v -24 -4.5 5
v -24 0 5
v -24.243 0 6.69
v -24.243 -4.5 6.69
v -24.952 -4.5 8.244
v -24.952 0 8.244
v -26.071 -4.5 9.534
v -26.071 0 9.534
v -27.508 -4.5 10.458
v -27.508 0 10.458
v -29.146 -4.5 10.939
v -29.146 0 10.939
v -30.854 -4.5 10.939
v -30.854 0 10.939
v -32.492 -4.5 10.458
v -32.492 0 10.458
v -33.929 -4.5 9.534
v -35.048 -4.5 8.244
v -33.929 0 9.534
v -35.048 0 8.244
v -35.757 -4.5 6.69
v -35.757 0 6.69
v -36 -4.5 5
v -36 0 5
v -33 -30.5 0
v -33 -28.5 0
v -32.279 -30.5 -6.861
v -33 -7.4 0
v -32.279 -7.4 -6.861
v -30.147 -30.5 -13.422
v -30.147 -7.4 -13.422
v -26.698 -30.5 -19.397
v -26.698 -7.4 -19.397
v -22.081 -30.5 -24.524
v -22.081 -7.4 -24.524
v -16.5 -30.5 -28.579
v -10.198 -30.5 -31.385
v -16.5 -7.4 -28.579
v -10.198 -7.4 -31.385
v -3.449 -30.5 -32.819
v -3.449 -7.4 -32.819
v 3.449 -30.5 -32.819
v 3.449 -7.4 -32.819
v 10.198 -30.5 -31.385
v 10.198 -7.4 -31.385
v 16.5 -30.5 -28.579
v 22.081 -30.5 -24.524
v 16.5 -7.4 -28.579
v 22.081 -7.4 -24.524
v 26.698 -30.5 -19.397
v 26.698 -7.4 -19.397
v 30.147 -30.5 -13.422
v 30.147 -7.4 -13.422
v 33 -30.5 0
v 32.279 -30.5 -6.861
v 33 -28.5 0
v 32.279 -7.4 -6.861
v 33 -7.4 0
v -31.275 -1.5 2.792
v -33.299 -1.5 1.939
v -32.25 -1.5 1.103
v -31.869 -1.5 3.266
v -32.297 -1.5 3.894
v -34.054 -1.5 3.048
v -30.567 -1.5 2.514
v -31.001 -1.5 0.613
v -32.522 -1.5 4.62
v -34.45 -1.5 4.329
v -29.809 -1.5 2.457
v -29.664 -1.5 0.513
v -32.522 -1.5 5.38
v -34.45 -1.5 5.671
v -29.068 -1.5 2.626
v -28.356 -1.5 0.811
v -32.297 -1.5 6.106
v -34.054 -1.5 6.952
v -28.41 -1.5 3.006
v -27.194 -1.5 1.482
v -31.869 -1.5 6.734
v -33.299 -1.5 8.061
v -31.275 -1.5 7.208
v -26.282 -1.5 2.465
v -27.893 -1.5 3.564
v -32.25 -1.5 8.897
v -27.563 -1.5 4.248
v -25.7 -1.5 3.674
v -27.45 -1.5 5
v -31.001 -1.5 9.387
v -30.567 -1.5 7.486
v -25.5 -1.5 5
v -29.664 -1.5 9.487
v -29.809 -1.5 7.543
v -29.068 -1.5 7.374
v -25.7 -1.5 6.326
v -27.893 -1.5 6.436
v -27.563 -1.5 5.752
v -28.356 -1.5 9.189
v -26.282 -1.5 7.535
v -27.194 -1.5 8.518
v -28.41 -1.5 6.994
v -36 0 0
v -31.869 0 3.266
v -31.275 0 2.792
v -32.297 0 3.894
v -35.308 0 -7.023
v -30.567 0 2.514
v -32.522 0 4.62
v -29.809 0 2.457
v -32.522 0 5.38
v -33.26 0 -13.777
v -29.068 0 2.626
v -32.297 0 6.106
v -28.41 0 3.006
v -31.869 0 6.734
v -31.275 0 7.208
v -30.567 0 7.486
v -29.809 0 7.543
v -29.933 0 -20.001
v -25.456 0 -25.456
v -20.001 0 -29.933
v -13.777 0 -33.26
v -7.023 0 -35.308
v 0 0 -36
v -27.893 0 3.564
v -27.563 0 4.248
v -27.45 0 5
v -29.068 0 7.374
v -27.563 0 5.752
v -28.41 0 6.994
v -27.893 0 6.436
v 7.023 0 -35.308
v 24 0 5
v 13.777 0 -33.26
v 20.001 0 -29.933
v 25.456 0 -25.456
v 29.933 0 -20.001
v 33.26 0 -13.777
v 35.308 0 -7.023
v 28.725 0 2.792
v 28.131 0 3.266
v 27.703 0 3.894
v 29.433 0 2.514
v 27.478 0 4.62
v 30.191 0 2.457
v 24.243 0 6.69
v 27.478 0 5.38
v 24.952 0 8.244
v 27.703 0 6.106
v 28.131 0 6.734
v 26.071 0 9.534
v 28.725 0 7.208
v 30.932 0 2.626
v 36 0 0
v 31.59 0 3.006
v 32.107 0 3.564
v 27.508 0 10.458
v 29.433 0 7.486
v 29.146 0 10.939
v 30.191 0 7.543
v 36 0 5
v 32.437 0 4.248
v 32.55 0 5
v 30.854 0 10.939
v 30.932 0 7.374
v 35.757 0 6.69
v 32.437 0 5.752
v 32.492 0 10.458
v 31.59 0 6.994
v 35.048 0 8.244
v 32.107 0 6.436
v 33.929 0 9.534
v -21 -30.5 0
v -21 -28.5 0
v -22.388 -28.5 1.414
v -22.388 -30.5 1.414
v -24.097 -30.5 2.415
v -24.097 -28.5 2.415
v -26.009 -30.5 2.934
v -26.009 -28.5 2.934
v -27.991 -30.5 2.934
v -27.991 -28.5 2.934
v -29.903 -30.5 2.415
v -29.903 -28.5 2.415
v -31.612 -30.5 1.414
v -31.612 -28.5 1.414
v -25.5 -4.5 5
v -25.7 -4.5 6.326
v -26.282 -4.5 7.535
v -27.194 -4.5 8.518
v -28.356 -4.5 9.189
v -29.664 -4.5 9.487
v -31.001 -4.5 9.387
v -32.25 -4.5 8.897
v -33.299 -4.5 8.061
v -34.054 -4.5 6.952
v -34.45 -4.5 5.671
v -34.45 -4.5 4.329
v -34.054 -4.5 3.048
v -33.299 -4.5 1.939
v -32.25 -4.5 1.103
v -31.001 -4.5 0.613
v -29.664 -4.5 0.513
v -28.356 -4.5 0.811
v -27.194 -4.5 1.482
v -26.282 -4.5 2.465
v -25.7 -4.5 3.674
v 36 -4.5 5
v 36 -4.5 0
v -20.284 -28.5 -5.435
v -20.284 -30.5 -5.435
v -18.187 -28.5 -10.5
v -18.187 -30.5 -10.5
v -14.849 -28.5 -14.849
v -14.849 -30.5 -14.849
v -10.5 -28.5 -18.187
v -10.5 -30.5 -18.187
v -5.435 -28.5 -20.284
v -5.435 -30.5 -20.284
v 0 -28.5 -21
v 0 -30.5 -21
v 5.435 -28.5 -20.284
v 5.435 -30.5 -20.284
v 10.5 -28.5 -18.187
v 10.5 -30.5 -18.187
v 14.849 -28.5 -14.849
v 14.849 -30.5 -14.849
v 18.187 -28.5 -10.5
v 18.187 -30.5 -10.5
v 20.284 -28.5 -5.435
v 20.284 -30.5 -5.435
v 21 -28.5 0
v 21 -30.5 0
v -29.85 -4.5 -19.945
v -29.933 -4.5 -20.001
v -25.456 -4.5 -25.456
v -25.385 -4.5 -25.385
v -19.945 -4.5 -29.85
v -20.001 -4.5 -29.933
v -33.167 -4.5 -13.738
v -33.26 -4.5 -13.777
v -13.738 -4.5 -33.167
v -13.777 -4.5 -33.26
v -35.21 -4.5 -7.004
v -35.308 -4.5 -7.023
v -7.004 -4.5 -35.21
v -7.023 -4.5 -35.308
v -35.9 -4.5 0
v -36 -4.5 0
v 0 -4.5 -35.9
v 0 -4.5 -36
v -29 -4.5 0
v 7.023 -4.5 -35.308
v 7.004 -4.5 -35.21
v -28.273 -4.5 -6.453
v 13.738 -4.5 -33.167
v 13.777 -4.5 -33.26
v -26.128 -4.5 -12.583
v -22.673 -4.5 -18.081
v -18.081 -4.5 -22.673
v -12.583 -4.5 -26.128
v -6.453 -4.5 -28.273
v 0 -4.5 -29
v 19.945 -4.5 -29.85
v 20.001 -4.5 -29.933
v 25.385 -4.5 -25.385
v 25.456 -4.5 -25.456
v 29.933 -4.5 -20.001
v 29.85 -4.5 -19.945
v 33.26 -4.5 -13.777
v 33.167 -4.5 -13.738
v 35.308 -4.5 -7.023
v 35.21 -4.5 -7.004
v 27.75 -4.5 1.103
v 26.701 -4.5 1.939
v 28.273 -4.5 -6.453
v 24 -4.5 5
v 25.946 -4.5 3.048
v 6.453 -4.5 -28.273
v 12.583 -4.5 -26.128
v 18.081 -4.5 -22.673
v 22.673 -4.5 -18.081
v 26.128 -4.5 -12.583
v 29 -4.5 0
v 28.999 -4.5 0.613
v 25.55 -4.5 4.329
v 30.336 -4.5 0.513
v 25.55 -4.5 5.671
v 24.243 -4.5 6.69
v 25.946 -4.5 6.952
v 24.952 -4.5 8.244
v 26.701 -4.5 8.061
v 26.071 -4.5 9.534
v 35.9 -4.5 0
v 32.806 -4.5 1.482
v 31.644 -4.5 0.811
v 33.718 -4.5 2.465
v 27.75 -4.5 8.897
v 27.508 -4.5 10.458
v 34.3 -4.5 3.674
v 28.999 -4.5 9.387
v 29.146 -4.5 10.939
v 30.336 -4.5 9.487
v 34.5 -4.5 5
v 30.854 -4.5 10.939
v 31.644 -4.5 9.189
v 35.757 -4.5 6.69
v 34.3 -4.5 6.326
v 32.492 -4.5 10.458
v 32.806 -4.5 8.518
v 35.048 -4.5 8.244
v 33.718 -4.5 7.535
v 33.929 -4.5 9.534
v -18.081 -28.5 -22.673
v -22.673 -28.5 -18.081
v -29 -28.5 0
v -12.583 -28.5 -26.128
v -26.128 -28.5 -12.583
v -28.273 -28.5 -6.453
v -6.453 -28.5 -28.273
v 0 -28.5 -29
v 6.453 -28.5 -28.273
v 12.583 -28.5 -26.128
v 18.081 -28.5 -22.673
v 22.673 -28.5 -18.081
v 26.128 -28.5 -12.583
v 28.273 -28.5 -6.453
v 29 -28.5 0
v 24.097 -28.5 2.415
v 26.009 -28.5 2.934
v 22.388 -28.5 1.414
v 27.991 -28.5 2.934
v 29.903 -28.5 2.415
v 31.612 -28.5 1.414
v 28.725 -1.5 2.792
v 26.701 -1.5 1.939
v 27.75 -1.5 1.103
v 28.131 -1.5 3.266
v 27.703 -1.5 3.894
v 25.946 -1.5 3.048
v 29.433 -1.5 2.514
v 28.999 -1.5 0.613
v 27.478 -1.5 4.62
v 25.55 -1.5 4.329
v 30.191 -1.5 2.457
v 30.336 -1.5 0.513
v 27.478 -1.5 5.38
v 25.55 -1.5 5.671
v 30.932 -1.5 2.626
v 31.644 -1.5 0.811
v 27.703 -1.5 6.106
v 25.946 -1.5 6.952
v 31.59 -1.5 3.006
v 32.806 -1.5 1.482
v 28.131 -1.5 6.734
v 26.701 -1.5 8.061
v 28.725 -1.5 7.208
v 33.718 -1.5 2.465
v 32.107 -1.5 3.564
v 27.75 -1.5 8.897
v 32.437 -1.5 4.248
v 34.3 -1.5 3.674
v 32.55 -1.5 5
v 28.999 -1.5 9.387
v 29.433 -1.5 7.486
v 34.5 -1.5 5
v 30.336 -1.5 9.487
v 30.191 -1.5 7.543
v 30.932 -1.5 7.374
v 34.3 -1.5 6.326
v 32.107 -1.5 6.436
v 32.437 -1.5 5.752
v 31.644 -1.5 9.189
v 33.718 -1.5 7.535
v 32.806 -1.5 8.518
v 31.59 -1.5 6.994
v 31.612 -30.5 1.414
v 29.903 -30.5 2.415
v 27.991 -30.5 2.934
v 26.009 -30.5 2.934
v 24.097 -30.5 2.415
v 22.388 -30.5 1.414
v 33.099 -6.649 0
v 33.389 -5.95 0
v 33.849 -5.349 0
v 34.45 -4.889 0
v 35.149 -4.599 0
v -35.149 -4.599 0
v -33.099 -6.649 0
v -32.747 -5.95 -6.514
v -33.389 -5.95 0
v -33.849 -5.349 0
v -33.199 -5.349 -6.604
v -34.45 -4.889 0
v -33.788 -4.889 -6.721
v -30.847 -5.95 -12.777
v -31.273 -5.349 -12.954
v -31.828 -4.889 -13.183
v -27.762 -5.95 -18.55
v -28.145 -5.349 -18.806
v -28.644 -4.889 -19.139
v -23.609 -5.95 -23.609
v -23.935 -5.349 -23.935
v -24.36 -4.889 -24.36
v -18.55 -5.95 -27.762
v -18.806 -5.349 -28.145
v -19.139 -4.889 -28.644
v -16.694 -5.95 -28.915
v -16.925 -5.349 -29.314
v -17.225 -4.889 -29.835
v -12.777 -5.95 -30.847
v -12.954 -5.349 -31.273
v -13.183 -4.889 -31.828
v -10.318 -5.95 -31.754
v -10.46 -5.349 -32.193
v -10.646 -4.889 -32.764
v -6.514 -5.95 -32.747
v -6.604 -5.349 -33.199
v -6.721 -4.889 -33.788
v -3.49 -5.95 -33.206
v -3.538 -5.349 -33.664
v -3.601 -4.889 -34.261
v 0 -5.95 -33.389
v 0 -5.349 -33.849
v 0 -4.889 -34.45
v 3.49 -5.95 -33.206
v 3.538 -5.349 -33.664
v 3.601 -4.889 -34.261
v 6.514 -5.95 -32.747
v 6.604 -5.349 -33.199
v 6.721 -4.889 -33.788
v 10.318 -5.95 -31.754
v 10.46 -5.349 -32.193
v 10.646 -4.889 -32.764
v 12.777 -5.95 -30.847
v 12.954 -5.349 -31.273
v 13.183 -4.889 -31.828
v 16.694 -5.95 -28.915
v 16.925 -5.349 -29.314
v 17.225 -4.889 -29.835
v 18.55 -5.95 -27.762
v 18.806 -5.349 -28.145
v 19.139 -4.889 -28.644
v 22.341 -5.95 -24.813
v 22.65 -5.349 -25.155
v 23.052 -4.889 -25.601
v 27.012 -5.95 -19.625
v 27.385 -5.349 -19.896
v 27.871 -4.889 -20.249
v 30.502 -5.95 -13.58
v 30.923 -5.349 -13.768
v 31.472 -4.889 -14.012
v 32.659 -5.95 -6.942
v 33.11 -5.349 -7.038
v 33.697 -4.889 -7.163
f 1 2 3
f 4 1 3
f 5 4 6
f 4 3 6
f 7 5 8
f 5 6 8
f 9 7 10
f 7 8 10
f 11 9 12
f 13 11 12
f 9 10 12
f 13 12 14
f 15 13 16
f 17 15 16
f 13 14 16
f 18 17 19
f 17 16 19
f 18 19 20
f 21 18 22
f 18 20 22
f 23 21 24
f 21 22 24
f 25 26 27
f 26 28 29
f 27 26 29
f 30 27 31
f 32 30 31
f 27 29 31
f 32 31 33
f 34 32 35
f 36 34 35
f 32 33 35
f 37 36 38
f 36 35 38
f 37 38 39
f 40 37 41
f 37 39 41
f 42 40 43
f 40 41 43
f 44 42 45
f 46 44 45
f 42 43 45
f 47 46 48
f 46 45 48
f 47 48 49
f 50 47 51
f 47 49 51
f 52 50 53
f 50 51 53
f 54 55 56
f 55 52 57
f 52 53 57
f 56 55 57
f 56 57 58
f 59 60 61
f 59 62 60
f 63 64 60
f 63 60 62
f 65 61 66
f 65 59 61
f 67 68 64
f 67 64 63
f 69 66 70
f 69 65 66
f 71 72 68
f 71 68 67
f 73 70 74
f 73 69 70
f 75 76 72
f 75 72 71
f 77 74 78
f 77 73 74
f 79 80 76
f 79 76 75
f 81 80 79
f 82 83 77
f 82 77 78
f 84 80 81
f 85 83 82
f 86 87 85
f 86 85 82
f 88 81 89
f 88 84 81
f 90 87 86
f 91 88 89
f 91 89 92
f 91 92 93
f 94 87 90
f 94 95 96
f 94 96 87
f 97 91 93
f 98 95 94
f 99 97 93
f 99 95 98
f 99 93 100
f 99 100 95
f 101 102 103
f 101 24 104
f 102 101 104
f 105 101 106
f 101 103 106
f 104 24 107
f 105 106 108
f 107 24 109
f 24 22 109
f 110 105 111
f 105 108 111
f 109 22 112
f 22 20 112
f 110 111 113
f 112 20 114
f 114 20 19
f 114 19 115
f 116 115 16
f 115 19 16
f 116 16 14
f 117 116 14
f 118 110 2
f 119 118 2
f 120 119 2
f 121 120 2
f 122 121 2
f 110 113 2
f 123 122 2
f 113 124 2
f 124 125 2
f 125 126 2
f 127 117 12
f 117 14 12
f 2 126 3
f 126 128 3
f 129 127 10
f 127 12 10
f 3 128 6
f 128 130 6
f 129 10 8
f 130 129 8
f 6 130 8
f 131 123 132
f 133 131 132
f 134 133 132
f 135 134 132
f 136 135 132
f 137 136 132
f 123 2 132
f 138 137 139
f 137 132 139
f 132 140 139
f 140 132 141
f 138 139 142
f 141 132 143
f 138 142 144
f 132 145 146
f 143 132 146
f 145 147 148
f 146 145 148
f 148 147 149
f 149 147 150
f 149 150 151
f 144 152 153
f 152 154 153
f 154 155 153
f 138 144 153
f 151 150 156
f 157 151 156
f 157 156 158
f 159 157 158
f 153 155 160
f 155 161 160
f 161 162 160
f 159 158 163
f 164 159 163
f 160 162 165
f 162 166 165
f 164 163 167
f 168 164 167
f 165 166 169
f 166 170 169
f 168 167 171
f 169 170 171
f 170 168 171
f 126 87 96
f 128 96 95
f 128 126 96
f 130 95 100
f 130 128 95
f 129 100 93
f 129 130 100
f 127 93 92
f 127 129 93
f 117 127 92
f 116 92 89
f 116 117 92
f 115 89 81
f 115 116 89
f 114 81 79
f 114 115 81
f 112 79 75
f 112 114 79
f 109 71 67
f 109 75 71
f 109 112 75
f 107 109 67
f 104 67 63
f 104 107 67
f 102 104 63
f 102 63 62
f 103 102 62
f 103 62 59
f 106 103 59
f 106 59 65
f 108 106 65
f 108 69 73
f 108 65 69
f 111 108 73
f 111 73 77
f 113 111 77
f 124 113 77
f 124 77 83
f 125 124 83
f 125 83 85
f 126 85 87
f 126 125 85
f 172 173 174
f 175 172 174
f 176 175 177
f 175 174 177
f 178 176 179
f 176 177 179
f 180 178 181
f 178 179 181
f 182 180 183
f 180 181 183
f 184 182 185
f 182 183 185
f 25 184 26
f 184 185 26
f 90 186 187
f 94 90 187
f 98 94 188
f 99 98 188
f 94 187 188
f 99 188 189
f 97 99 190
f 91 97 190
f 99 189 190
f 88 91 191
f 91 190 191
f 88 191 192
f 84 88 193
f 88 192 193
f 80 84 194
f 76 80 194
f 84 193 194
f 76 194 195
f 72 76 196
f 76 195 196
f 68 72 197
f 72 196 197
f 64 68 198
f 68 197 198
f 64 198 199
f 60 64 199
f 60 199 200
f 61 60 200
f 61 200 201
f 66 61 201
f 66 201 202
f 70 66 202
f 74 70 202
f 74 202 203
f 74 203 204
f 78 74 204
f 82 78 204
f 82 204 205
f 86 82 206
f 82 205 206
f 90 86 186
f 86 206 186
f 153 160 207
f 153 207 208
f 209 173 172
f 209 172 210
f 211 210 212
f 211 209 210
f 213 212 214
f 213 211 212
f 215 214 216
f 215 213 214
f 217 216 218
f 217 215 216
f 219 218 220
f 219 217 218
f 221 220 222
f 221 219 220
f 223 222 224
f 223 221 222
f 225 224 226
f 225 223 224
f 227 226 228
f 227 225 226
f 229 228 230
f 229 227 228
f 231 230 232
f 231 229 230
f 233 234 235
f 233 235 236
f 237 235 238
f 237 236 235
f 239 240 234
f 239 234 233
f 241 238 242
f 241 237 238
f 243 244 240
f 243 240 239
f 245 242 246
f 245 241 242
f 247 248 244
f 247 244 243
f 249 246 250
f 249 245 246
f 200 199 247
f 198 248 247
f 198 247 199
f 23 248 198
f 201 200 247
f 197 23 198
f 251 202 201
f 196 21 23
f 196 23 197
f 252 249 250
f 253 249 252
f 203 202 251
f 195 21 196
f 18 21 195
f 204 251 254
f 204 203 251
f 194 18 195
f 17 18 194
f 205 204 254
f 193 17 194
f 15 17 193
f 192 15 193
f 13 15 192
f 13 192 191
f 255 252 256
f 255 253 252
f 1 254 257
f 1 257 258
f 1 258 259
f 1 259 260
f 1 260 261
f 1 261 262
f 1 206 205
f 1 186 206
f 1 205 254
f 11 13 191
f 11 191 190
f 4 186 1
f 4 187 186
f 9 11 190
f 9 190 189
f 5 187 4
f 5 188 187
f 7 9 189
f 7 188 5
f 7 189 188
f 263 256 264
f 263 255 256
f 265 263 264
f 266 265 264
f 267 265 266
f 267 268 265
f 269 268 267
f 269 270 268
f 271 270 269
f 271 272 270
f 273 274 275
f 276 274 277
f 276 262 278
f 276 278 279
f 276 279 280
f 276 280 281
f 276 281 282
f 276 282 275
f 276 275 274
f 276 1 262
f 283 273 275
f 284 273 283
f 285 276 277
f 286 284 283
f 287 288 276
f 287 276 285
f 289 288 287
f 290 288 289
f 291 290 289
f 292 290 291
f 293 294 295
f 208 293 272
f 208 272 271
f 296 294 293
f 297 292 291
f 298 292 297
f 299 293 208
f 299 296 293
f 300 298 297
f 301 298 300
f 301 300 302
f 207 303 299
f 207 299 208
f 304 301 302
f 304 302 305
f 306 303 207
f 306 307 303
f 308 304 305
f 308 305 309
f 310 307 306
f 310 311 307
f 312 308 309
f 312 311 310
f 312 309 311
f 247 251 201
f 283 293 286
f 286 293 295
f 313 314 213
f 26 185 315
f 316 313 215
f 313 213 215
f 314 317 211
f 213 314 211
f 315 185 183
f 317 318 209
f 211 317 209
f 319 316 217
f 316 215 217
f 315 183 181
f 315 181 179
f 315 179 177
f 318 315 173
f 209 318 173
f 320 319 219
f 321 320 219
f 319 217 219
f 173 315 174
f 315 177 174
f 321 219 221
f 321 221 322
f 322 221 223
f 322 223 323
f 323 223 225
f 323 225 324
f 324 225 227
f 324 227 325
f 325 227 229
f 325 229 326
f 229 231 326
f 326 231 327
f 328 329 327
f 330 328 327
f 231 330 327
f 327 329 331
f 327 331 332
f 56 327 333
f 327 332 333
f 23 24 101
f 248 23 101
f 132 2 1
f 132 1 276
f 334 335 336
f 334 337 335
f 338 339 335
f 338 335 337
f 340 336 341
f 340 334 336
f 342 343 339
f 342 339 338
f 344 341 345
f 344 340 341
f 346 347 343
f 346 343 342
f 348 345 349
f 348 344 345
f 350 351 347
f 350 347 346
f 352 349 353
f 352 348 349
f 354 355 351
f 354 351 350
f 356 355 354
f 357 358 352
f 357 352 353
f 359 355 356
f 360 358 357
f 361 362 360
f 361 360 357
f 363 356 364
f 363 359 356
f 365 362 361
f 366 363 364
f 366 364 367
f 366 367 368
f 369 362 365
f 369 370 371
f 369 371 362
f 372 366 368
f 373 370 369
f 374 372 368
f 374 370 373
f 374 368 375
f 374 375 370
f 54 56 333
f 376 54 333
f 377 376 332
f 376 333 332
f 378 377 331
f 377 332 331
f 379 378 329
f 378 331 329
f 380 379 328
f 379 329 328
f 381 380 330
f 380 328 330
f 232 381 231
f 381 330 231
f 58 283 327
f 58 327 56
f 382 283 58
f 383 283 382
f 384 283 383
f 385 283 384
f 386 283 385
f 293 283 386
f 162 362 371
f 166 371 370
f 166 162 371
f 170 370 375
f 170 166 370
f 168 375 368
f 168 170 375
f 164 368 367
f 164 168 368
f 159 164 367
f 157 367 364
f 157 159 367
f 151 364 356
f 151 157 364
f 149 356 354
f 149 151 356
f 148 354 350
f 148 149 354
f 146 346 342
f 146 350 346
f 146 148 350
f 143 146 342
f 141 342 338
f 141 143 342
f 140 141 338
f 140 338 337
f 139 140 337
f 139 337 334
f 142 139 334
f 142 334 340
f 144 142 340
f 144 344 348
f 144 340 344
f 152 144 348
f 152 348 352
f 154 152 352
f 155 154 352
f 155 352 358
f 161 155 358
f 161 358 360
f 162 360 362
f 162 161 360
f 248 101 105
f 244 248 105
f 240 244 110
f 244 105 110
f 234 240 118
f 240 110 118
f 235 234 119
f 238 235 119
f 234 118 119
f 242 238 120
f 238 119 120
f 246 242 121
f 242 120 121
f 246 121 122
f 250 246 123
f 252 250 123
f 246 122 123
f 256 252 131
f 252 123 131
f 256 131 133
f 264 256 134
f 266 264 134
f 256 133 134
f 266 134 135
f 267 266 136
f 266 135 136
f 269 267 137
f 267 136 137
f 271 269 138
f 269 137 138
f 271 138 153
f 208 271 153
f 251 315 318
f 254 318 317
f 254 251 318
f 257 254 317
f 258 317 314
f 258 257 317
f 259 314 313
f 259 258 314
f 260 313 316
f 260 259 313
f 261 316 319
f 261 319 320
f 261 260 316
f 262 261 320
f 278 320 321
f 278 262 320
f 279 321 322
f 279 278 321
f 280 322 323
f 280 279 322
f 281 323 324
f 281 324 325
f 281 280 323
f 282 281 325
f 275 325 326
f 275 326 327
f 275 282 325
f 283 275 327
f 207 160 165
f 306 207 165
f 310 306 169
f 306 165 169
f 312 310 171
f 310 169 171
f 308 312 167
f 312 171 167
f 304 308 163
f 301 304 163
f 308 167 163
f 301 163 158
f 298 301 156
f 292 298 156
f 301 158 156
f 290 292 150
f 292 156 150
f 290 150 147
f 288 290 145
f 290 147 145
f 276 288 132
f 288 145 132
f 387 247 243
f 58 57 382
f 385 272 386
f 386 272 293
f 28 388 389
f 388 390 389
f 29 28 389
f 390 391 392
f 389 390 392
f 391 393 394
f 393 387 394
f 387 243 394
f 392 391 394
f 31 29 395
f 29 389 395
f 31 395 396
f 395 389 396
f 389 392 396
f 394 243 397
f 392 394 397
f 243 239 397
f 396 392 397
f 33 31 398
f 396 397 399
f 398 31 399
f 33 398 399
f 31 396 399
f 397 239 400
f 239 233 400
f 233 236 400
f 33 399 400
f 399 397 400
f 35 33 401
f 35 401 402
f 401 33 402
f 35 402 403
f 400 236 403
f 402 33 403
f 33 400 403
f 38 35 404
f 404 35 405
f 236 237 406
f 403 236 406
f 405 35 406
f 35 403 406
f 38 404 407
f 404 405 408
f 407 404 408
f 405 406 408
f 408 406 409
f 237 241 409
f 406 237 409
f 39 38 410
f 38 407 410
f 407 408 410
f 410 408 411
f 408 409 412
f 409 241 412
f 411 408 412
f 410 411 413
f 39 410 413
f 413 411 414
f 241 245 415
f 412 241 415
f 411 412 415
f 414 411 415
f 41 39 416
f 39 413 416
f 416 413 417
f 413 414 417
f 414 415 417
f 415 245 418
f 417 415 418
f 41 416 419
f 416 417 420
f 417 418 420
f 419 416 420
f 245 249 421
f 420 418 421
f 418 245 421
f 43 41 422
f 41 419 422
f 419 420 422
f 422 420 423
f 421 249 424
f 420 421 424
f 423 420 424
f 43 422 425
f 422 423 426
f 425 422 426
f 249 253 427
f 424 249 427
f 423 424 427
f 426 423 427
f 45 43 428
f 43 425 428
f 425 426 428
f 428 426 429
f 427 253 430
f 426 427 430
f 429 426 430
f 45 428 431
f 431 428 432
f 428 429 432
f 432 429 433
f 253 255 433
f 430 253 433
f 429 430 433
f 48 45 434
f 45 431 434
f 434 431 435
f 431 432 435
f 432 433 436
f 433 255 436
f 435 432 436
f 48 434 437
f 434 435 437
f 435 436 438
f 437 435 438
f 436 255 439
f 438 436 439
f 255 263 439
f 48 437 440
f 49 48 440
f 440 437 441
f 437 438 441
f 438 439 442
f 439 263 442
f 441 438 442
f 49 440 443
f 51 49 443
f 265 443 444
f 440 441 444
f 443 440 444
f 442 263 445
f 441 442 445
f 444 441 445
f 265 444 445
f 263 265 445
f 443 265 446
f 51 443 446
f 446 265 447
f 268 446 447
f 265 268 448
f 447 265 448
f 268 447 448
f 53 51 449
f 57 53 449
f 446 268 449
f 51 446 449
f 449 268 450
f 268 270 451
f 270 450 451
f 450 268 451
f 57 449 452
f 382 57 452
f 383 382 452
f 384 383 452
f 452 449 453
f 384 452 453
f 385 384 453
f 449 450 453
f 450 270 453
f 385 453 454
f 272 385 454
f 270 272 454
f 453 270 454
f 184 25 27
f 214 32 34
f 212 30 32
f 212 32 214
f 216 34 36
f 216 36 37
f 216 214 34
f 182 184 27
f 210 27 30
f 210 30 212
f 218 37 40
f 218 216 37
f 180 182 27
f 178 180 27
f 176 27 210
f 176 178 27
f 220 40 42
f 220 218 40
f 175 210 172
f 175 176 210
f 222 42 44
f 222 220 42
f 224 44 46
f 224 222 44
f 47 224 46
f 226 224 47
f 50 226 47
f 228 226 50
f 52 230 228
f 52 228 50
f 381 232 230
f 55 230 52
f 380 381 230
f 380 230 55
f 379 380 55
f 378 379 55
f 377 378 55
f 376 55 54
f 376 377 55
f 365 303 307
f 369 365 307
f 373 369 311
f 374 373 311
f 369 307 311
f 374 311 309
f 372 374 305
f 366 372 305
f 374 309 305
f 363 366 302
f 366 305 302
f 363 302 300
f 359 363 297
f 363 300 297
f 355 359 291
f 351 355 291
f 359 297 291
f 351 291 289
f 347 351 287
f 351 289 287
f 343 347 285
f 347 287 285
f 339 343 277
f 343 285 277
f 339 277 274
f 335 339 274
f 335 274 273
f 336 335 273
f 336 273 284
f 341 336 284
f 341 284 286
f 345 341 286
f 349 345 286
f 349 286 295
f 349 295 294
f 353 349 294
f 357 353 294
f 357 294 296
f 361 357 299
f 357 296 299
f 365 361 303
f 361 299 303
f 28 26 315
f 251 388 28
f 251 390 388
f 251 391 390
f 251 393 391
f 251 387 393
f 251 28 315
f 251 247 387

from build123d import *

# Parameters (mm, degrees)
SKETCH_R     = 2.55
PAD_DEPTH    = 4.5
PAD001_DEPTH = 24
PAD002_DEPTH = 2
SKETCH004_R  = 4.5
POCKET_DEPTH = 3
FILLET_R     = 2.9


with BuildPart() as part:
    # Sketch → Pad (new body)
    with BuildSketch(Plane.XZ):
        with BuildLine():
            Line((-36, 5), (-36, 0))
            ThreePointArc((-36, 0), (0, -36), (36, 0))
            Line((36, 5), (36, 0))
            ThreePointArc((36, 5), (30, 11), (24, 5))
            Line((-24, 5), (24, 5))
            ThreePointArc((-24, 5), (-30, 11), (-36, 5))
        make_face()
        with Locations((-30, 5)):
            Circle(SKETCH_R, mode=Mode.SUBTRACT)
        with Locations((30, 5)):
            Circle(SKETCH_R, mode=Mode.SUBTRACT)
    extrude(amount=PAD_DEPTH)

    # Sketch002 (on Face10 of Pad) → Pad001 (join)
    with BuildSketch(Plane.XZ.offset(4.5)):
        with BuildLine():
            ThreePointArc((-33, 0), (0, -33), (33, 0))
            Line((29, 0), (33, 0))
            ThreePointArc((-29, 0), (0, -29), (29, 0))
            Line((-33, 0), (-29, 0))
        make_face()
    extrude(amount=PAD001_DEPTH)

    # Sketch003 (on Face15 of Pad001) → Pad002 (join)
    with BuildSketch(Plane.XZ.offset(28.5)):
        with BuildLine():
            ThreePointArc((-33, 0), (0, -33), (33, 0))
            ThreePointArc((33, 0), (27, 3), (21, 0))
            ThreePointArc((-21, 0), (0, -21), (21, 0))
            ThreePointArc((-21, 0), (-27, 3), (-33, 0))
        make_face()
    extrude(amount=PAD002_DEPTH)

    # Sketch004 (on Face10 of Pad) → Pocket (cut)
    with BuildSketch(Plane.XZ.offset(4.5)):
        with Locations((-30, 5)):
            Circle(SKETCH004_R)
        with Locations((30, 5)):
            Circle(SKETCH004_R)
    extrude(amount=-POCKET_DEPTH, mode=Mode.SUBTRACT)

    # Fillet
    fillet_edges = [part.edges().sort_by_distance(p)[0] for p in [
        (0, -4.5, -33),
    ]]
    fillet(fillet_edges, radius=FILLET_R)


solid = part.part
